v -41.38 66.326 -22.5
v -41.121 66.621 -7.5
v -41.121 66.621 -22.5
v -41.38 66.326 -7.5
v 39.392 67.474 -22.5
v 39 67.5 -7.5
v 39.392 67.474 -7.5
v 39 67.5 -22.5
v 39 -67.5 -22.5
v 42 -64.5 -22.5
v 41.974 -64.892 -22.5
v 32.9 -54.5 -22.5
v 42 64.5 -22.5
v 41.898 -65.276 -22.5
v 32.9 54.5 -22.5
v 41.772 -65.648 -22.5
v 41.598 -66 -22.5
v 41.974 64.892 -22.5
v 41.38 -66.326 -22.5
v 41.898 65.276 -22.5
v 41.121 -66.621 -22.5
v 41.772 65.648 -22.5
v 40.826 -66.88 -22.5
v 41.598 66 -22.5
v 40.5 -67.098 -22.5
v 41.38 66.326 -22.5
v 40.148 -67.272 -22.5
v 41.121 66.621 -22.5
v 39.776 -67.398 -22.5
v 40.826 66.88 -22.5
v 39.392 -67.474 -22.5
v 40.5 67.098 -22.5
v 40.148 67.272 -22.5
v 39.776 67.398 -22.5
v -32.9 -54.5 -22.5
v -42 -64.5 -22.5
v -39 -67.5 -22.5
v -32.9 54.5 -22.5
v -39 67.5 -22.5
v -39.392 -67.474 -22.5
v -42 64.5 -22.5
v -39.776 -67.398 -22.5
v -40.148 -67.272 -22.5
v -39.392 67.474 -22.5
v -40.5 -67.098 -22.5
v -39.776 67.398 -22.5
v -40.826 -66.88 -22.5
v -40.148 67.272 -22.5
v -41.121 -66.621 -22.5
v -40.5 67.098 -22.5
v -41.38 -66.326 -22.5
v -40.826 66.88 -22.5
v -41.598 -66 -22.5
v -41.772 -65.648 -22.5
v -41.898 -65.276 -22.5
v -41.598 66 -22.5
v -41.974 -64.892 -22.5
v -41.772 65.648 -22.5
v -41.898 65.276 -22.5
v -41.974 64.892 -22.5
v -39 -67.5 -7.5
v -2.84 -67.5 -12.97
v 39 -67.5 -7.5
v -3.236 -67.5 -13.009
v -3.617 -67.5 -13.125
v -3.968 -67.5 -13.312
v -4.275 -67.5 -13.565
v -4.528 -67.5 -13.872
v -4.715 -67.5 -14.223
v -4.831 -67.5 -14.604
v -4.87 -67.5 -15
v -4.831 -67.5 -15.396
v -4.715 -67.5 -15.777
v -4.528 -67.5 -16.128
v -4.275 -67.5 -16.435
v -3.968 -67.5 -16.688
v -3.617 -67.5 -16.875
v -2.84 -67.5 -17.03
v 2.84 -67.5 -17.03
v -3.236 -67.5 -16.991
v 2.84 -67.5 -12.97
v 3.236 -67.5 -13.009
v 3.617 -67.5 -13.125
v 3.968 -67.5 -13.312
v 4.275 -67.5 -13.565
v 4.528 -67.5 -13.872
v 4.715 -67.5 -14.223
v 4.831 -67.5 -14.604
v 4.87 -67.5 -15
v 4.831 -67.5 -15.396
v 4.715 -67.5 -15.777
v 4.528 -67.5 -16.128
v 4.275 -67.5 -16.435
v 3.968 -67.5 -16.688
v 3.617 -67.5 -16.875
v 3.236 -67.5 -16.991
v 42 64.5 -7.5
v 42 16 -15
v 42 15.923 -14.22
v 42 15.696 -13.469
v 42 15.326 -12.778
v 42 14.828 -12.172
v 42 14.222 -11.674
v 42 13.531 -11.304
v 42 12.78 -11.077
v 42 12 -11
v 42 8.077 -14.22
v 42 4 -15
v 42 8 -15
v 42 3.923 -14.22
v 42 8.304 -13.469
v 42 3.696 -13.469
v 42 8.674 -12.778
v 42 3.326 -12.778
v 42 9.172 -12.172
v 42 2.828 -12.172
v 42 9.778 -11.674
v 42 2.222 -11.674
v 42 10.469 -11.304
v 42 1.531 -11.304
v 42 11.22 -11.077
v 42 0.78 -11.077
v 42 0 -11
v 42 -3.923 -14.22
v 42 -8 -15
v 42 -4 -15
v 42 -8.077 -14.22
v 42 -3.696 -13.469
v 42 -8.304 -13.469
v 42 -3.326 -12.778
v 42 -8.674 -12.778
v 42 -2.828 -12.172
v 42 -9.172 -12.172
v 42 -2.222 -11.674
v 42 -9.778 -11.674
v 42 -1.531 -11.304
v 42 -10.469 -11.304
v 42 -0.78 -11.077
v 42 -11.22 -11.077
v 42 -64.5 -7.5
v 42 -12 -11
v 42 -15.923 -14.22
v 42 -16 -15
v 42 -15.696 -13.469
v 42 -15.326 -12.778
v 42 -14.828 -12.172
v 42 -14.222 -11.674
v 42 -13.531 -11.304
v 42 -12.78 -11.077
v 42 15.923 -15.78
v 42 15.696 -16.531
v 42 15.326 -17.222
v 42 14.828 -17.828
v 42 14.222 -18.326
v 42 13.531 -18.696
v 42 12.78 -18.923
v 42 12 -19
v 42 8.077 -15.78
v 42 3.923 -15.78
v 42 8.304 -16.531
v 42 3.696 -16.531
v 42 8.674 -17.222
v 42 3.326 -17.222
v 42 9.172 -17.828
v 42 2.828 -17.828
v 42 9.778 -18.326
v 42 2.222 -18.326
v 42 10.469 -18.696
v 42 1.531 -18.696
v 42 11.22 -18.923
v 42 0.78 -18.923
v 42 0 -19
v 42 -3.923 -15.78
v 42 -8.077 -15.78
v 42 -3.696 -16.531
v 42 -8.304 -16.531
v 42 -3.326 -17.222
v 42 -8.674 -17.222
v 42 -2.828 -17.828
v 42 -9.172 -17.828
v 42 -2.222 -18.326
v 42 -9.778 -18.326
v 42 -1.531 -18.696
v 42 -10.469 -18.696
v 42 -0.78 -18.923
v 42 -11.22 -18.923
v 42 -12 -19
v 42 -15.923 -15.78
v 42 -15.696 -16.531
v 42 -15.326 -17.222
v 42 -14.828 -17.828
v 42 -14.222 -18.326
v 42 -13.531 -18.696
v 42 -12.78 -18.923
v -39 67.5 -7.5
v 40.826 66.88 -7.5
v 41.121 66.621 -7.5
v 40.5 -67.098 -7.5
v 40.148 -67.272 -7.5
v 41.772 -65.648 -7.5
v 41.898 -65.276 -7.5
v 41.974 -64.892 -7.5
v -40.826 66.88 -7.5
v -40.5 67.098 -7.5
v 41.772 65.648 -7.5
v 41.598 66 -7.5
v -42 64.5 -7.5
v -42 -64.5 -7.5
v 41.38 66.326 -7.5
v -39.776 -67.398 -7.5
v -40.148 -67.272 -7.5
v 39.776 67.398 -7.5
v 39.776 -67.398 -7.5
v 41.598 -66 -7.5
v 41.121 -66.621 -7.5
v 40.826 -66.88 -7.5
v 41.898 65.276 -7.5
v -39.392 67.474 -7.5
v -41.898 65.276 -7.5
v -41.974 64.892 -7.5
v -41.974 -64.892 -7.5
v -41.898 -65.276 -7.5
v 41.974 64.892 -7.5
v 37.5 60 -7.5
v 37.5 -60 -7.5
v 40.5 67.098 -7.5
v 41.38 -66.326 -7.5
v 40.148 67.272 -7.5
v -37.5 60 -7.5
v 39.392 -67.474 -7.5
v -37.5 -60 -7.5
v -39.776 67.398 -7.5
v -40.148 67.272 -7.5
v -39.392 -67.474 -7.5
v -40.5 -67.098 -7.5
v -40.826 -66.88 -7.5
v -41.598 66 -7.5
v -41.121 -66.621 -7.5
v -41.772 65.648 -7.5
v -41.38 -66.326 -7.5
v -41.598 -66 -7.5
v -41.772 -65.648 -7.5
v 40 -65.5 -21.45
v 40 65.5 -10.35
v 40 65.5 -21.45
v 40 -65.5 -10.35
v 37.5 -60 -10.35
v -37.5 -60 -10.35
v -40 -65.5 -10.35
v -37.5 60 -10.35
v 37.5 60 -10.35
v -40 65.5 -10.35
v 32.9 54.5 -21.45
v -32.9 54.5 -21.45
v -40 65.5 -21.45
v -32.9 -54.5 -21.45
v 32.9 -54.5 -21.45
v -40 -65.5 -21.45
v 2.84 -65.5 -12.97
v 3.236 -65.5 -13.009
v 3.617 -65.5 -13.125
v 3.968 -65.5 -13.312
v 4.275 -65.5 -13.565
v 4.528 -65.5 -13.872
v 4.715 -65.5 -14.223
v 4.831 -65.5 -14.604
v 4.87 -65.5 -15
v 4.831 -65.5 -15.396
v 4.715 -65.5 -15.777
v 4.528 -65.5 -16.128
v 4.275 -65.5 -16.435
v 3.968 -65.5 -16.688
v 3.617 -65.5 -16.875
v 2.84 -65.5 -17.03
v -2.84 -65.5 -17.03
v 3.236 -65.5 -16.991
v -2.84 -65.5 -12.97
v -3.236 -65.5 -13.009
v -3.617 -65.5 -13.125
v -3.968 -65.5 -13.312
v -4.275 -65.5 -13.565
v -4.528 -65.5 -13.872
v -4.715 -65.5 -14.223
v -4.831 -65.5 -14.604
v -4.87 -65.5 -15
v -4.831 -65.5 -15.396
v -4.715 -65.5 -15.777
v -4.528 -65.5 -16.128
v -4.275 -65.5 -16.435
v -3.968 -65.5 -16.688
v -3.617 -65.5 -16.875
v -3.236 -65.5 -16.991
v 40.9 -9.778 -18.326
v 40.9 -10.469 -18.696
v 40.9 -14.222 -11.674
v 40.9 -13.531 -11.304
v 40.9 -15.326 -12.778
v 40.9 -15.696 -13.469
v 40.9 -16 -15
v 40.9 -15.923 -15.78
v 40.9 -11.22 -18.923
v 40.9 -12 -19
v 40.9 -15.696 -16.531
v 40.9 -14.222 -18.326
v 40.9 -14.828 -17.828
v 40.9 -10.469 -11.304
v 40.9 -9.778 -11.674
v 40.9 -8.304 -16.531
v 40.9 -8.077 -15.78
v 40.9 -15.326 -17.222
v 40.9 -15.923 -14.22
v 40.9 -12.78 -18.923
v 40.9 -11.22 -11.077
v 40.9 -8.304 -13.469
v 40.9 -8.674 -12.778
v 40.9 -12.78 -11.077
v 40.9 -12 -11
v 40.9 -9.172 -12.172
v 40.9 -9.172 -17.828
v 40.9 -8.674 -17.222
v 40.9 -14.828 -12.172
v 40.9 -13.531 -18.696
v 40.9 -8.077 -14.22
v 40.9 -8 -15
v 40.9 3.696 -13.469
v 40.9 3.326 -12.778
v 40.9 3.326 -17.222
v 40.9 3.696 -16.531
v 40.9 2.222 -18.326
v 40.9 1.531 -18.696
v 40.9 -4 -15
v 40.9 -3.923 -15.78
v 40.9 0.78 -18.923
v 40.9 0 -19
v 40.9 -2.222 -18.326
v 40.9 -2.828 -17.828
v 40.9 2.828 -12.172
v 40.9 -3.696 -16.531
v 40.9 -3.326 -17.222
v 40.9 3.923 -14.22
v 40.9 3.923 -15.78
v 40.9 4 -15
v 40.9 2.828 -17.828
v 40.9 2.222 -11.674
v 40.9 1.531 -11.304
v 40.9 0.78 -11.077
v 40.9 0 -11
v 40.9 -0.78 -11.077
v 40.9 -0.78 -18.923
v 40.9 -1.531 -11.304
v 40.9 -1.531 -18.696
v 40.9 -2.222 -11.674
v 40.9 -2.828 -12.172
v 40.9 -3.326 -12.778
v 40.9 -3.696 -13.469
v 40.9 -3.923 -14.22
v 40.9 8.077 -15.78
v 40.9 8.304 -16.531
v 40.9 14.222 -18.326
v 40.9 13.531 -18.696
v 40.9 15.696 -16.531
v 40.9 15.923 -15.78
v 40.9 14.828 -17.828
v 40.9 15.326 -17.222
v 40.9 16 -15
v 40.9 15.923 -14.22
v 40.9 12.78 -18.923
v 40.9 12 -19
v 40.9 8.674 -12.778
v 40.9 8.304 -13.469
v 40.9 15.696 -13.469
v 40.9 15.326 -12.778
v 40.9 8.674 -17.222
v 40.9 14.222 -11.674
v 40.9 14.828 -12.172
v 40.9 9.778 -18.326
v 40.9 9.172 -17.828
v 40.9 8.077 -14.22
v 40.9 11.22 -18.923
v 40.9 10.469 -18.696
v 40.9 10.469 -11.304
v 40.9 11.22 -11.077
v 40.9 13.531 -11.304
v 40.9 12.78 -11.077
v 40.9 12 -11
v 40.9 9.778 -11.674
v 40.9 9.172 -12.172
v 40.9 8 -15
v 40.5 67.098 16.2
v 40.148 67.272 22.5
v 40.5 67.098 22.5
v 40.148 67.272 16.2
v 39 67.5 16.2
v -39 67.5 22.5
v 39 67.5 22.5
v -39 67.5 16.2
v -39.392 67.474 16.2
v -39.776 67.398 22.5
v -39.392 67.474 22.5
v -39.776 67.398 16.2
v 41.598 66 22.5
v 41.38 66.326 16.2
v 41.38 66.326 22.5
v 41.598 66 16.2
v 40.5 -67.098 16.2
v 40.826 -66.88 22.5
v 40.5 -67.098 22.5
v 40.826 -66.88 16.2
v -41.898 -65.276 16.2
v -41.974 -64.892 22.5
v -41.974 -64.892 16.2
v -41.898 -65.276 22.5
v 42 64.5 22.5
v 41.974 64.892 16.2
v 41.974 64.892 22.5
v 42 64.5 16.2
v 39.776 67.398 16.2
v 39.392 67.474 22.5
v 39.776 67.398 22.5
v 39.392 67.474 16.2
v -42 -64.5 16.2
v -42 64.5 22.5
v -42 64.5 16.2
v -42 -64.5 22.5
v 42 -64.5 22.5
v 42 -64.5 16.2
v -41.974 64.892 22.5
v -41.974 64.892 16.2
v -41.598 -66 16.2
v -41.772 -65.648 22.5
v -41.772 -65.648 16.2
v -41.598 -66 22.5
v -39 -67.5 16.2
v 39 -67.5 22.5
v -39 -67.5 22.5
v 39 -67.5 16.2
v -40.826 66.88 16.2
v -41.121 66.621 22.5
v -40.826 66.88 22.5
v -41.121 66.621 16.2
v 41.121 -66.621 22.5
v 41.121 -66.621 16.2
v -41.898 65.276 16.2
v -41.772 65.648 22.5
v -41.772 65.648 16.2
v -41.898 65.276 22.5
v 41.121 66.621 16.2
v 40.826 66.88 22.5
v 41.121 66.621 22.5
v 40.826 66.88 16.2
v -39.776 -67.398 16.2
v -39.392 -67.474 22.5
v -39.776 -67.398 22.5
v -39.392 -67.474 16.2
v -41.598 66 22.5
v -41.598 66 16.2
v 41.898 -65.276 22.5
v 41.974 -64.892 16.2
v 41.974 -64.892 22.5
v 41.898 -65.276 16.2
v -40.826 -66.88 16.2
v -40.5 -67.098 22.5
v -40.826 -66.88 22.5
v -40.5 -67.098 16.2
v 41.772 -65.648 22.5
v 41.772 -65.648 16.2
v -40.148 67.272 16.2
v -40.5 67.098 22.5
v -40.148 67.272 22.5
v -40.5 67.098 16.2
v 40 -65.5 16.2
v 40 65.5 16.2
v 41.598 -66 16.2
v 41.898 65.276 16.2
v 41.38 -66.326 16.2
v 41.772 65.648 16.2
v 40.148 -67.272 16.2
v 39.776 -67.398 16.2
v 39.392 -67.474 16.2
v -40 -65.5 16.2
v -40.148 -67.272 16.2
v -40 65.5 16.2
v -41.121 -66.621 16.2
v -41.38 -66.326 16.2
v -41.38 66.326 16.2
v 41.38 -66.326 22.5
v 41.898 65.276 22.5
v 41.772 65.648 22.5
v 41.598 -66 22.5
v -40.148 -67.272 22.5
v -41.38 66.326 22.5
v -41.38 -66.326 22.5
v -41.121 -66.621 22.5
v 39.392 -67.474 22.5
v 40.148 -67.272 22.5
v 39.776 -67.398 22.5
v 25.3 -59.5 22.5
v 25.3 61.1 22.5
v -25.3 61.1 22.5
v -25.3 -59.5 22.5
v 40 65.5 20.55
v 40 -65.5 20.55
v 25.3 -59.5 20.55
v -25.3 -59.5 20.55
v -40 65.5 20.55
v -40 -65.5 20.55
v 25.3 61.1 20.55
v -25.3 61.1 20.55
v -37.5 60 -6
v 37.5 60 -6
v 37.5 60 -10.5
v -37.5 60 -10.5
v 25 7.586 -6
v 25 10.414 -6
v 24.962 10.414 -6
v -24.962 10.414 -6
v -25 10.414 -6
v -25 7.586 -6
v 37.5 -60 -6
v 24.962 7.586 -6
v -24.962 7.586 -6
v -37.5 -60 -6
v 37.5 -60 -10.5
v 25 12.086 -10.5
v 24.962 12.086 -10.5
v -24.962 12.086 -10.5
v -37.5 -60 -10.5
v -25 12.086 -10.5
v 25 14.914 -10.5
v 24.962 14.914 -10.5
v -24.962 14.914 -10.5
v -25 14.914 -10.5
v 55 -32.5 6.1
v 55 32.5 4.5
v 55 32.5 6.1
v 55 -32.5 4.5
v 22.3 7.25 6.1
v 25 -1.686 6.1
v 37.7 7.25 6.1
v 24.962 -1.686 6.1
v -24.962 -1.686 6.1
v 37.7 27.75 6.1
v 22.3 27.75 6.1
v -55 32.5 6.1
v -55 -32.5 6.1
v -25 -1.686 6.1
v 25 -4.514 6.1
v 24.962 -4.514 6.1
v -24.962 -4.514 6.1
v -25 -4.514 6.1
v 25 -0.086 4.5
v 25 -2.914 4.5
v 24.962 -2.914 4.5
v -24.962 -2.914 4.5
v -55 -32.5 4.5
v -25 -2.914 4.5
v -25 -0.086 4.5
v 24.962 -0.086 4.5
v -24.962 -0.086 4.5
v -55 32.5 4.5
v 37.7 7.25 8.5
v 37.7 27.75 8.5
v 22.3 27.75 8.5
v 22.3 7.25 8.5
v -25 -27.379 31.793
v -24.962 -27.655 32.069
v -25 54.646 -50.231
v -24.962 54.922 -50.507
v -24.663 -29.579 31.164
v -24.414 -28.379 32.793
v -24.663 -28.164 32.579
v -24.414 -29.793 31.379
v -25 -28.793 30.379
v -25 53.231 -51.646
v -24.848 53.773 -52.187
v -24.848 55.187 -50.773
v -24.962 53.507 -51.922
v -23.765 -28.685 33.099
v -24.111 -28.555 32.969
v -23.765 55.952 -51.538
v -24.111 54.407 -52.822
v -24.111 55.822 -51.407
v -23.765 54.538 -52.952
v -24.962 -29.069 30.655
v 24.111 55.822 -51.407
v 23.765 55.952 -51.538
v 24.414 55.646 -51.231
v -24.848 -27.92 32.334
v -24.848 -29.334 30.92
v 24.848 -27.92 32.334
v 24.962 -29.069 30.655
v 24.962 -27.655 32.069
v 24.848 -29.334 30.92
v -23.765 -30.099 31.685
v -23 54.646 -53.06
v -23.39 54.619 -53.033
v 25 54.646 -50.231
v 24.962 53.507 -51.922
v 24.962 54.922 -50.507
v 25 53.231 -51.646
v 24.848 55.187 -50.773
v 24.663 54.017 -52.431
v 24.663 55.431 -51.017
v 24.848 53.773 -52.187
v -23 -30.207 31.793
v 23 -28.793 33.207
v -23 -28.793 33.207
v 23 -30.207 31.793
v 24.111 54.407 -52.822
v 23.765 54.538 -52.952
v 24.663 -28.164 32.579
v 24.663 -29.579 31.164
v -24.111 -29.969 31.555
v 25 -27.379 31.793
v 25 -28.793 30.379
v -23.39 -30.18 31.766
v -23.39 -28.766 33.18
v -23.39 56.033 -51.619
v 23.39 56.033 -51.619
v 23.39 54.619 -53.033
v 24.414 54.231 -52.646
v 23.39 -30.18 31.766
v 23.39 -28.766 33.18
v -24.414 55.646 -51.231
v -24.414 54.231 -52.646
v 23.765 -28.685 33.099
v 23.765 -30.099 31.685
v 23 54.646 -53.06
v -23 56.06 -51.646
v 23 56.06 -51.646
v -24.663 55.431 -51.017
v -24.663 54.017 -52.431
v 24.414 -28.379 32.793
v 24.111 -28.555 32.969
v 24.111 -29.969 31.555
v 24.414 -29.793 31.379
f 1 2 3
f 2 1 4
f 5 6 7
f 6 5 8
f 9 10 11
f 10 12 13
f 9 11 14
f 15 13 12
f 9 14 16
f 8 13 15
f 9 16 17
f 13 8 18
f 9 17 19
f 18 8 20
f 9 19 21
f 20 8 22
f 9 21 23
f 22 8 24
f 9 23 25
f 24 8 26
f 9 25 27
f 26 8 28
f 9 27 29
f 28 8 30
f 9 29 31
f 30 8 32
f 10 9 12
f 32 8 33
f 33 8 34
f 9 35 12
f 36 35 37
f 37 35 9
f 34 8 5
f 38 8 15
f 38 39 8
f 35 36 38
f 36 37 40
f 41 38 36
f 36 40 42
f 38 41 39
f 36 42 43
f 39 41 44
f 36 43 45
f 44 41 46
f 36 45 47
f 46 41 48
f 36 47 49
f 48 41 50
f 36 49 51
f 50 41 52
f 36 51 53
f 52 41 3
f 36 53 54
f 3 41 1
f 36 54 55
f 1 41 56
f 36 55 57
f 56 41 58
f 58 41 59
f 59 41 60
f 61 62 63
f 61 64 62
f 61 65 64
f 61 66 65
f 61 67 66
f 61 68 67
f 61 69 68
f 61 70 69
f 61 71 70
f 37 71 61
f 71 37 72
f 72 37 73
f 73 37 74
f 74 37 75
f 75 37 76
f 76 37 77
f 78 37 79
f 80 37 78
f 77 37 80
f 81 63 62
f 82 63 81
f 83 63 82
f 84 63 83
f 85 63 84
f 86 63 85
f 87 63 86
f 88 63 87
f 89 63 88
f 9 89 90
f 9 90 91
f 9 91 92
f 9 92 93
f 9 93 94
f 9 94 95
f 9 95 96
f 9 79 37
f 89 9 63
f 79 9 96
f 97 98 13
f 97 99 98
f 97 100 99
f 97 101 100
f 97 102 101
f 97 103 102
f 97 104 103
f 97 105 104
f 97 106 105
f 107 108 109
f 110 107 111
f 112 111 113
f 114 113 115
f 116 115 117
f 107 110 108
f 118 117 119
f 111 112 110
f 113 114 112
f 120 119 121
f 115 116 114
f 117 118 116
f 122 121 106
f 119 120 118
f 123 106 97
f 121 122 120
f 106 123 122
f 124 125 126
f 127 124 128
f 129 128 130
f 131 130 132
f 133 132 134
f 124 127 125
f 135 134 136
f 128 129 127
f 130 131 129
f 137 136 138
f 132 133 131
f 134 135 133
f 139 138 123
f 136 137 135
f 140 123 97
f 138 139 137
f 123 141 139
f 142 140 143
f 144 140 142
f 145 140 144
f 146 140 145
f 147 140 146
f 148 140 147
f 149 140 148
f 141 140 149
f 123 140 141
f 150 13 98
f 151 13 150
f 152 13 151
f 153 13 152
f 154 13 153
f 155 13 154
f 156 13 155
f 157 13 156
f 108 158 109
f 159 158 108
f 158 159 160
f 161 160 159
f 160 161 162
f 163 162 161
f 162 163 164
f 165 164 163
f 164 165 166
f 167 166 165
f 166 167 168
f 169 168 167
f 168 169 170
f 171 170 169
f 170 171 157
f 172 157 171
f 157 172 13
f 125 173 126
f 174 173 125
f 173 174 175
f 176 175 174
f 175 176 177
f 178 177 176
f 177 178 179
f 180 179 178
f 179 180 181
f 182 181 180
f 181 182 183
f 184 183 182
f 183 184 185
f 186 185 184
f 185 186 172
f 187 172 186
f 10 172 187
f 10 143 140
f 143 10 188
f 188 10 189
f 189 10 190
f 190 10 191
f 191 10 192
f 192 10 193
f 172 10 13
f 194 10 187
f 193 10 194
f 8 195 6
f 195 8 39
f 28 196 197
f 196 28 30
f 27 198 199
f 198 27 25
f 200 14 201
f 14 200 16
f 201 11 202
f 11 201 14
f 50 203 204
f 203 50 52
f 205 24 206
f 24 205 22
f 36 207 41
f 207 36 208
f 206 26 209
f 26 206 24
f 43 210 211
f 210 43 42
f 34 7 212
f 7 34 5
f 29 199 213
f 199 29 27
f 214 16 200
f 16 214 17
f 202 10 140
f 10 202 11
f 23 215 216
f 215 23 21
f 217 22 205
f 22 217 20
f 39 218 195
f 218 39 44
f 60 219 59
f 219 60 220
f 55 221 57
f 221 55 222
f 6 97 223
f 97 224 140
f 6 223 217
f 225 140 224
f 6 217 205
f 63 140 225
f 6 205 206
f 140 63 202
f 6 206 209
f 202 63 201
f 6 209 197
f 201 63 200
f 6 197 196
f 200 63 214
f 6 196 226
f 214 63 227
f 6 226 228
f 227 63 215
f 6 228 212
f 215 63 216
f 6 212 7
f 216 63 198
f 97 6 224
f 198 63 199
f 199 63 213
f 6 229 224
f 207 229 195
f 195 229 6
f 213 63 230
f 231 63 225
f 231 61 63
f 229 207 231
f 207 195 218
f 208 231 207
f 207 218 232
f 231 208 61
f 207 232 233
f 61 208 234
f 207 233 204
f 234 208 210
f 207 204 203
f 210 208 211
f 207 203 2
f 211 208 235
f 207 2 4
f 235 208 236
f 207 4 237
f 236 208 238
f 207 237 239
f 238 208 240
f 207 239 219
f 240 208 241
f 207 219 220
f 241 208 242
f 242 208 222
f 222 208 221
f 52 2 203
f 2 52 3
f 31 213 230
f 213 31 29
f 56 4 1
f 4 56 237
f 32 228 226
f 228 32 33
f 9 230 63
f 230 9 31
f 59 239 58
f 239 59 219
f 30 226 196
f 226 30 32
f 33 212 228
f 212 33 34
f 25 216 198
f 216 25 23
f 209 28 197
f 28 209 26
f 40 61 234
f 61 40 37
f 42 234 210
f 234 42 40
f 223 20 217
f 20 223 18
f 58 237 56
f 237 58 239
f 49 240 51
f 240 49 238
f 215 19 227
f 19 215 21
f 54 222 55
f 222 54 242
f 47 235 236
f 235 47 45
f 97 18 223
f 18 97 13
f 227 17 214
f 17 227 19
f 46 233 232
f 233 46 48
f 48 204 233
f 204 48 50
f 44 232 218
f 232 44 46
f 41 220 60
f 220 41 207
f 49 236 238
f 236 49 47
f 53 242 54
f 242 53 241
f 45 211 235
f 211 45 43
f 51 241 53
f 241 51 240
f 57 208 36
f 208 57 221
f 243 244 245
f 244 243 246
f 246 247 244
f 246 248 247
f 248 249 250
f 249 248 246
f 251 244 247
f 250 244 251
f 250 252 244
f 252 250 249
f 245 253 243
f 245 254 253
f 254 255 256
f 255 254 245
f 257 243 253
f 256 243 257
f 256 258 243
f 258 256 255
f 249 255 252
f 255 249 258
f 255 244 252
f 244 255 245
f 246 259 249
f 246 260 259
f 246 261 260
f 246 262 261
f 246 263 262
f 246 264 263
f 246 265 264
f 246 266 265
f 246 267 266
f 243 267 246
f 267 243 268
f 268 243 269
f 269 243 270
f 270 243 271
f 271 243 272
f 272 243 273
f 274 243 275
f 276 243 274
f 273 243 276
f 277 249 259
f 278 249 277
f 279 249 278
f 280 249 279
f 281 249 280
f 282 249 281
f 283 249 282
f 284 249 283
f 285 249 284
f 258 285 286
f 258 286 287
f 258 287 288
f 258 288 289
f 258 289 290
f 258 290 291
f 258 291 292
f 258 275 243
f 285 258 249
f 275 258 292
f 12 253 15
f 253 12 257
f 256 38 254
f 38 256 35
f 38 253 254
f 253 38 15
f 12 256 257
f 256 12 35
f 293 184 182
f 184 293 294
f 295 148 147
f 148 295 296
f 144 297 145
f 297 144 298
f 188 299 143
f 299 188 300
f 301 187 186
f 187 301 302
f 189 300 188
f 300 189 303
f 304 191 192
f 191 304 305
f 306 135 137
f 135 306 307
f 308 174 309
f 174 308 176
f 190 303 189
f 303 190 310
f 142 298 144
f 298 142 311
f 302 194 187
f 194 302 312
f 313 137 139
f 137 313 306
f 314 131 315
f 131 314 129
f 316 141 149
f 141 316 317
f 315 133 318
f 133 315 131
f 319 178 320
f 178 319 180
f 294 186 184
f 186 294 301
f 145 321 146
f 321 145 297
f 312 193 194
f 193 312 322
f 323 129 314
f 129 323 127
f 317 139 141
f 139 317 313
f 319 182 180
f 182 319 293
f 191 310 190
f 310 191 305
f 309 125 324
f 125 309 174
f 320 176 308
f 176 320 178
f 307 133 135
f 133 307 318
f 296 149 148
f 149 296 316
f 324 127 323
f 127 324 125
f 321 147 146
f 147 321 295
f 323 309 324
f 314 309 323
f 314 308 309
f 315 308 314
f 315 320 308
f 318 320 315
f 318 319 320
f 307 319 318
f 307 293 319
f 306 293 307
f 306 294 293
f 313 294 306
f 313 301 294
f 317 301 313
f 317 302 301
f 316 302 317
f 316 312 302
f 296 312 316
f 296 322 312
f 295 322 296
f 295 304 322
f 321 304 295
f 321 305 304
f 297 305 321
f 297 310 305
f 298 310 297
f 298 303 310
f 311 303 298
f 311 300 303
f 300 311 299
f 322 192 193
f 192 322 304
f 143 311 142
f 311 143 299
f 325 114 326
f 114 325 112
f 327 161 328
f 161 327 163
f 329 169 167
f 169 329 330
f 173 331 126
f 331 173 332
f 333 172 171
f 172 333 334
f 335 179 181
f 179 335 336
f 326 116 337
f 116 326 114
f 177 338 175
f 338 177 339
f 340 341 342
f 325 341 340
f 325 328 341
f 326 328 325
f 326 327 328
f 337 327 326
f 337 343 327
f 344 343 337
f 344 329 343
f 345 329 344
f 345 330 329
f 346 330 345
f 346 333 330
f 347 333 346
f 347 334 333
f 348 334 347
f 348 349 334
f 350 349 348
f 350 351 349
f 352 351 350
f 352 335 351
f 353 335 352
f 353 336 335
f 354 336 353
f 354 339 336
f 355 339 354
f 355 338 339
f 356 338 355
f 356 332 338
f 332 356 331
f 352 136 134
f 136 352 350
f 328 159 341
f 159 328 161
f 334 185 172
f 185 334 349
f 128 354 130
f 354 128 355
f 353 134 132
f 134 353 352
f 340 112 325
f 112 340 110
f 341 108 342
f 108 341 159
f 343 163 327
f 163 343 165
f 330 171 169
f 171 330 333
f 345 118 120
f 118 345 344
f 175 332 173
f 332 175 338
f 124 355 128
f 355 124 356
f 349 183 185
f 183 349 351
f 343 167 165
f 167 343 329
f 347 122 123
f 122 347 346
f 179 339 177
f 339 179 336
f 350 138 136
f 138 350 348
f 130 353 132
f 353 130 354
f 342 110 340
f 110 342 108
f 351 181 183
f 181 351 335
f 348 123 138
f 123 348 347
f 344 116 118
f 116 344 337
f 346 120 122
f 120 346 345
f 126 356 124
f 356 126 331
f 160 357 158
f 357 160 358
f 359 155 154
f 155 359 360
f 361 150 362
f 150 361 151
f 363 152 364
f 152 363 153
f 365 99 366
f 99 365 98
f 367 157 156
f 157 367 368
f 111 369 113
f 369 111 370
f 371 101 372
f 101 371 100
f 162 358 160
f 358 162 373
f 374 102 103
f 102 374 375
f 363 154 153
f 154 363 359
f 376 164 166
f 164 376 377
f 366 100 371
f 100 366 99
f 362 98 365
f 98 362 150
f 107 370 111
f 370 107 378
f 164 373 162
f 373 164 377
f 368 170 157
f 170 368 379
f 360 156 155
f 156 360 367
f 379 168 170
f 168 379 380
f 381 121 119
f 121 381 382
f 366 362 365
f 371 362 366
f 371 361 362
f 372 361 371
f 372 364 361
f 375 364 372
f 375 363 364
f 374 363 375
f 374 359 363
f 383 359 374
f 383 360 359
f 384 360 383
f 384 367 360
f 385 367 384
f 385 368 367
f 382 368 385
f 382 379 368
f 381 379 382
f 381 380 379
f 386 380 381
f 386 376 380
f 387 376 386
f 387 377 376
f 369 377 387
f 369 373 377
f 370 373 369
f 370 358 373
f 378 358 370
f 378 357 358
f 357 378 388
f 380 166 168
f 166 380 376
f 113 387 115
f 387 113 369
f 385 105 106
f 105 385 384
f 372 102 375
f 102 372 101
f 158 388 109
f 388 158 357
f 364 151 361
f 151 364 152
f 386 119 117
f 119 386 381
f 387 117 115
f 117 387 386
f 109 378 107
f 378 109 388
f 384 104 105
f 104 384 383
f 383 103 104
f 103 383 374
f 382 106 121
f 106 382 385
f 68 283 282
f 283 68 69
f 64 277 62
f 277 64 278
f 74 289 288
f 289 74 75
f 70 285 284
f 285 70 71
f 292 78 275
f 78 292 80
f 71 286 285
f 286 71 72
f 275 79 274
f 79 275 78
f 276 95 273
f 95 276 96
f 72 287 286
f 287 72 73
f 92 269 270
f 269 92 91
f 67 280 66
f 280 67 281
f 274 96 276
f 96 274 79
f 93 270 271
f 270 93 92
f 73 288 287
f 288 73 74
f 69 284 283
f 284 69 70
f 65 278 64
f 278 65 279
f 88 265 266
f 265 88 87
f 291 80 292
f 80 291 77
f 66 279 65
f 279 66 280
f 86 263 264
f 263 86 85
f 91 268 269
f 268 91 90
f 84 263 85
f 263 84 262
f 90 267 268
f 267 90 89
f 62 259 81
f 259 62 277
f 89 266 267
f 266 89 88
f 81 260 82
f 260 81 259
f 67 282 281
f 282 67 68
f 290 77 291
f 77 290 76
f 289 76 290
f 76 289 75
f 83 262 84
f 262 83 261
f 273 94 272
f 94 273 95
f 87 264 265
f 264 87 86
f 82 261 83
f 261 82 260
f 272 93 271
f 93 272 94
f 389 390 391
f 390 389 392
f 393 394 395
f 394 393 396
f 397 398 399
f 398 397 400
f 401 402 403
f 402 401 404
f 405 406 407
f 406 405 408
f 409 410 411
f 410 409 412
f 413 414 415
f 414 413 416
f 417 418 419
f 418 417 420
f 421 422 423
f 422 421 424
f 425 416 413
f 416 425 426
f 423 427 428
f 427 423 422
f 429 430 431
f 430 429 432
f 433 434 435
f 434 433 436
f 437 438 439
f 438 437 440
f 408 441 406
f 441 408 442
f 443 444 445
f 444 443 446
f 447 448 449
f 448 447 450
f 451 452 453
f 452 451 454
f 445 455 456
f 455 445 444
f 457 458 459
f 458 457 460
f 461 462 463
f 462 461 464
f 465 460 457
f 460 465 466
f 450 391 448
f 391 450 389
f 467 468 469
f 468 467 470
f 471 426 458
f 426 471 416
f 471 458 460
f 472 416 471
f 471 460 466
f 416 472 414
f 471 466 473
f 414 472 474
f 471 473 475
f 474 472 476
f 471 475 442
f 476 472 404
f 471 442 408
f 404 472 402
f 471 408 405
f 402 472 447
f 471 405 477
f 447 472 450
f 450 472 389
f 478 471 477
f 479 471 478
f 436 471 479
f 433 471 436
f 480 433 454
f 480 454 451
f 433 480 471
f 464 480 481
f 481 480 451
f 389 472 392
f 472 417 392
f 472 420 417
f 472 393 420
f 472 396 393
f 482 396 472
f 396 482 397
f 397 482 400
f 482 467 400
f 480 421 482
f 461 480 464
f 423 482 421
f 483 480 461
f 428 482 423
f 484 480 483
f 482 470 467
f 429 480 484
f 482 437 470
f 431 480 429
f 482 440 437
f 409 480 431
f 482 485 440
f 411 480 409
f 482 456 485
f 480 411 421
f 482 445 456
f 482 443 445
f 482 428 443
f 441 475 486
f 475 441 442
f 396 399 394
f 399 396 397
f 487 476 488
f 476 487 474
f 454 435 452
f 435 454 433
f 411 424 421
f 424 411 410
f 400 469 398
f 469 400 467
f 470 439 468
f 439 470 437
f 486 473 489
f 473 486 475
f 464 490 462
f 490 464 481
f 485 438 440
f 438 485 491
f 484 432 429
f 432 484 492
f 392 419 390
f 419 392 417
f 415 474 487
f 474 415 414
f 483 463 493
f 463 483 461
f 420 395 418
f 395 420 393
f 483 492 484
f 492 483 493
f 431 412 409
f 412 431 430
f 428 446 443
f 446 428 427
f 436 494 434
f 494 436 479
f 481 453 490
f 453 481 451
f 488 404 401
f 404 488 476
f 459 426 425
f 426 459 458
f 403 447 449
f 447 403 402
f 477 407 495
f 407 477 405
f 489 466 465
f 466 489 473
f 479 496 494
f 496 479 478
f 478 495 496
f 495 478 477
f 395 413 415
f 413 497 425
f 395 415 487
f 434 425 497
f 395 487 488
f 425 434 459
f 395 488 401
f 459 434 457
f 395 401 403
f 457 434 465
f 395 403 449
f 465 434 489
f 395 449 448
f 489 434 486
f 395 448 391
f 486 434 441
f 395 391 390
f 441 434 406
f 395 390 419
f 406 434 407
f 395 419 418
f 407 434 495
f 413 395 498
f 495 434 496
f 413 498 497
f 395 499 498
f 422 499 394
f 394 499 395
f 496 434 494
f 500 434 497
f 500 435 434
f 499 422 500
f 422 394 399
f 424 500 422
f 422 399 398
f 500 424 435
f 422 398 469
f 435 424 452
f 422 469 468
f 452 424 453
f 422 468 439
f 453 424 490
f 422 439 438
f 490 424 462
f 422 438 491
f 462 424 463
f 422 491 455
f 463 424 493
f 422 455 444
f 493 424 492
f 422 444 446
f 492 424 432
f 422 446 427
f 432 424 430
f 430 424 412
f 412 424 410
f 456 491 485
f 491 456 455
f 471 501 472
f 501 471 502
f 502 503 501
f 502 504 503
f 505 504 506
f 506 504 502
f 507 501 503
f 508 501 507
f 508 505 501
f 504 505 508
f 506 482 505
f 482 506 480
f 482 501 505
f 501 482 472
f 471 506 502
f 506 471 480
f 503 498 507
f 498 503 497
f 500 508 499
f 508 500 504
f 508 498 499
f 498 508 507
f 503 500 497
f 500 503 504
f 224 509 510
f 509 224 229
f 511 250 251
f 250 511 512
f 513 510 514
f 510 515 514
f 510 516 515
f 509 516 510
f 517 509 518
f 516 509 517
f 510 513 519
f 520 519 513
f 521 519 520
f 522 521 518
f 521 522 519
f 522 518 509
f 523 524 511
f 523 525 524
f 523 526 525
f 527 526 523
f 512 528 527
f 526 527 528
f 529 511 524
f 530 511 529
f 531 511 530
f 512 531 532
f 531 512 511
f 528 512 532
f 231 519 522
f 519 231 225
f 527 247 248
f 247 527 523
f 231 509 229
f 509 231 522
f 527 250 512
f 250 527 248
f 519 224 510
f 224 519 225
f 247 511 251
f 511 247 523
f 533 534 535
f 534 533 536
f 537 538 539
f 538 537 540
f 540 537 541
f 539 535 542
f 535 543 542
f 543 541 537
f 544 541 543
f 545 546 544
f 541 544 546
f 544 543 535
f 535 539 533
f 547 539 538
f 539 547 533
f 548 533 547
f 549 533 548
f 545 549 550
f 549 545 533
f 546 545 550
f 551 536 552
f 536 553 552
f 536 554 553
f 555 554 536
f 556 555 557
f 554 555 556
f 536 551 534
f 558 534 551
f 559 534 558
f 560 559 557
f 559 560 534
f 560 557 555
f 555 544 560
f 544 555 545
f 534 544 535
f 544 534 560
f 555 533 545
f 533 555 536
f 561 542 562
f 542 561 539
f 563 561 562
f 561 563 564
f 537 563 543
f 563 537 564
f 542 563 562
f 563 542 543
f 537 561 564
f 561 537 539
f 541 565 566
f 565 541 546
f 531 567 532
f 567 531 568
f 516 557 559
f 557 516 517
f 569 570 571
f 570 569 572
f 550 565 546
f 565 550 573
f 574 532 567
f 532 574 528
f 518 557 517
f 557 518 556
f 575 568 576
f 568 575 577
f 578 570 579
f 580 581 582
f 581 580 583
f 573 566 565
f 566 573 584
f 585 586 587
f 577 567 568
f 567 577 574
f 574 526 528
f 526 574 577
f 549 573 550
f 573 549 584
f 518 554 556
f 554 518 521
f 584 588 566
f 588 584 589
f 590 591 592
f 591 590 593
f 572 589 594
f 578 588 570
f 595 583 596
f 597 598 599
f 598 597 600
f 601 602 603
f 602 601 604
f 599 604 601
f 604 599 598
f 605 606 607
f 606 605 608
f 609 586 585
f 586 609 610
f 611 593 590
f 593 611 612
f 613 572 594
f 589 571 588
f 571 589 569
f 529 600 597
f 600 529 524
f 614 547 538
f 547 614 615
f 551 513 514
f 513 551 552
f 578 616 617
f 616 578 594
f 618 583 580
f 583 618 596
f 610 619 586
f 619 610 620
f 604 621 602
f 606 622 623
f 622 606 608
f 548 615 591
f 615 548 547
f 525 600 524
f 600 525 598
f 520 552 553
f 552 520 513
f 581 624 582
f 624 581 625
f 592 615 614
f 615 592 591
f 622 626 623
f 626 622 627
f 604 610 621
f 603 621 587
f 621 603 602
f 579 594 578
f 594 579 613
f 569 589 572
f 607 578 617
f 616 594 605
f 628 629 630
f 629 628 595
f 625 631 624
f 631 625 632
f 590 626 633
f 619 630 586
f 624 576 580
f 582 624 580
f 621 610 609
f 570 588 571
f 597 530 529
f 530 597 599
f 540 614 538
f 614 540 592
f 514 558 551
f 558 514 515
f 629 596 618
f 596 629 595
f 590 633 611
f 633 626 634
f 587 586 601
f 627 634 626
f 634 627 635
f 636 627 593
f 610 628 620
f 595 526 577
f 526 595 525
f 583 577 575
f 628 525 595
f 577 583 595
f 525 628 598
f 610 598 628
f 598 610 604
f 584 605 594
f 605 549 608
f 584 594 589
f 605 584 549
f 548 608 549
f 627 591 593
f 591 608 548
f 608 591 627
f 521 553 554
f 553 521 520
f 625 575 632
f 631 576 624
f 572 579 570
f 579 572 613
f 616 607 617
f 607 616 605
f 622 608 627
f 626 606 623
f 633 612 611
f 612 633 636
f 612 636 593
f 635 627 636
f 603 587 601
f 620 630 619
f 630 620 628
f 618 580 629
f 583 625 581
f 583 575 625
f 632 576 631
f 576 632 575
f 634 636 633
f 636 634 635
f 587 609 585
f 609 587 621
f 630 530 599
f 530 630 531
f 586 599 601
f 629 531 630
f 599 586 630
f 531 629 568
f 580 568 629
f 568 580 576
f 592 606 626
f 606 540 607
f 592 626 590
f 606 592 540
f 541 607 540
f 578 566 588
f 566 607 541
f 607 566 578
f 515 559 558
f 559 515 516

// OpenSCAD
union() {
	translate(v = [0, 0, -15]) {
		color(alpha = 0.9, c = "LightGray") {
			difference() {
				difference() {
					difference() {
						difference() {
							difference() {
								hull() {
									translate(v = [-39.0, -64.5, 0]) {
										cylinder($fn = 48, center = true, h = 15.0, r = 3.0);
									}
									translate(v = [-39.0, 64.5, 0]) {
										cylinder($fn = 48, center = true, h = 15.0, r = 3.0);
									}
									translate(v = [39.0, -64.5, 0]) {
										cylinder($fn = 48, center = true, h = 15.0, r = 3.0);
									}
									translate(v = [39.0, 64.5, 0]) {
										cylinder($fn = 48, center = true, h = 15.0, r = 3.0);
									}
								}
								translate(v = [0, 0, -0.9]) {
									cube(center = true, size = [80.0, 131.0, 11.1]);
								}
							}
							translate(v = [0, 0, -3.0]) {
								cube(center = true, size = [75.4, 120.4, 5.1]);
							}
						}
						translate(v = [0, 0, -6.5]) {
							cube(center = true, size = [65.8, 109.0, 2.2]);
						}
					}
					union() {
						translate(v = [42.0, -12.0, 0]) {
							rotate(a = [0, 90, 0]) {
								cylinder($fn = 32, center = true, d = 8.0, h = 2.2);
							}
						}
						translate(v = [42.0, 0.0, 0]) {
							rotate(a = [0, 90, 0]) {
								cylinder($fn = 32, center = true, d = 8.0, h = 2.2);
							}
						}
						translate(v = [42.0, 12.0, 0]) {
							rotate(a = [0, 90, 0]) {
								cylinder($fn = 32, center = true, d = 8.0, h = 2.2);
							}
						}
					}
				}
				translate(v = [0, -67.5, 0]) {
					rotate(a = [90, 0, 0]) {
						linear_extrude(center = true, height = 15.2) {
							hull() {
								translate(v = [-2.84, 0]) {
									circle($fn = 32, r = 2.0300000000000002);
								}
								translate(v = [2.84, 0]) {
									circle($fn = 32, r = 2.0300000000000002);
								}
							}
						}
					}
				}
			}
		}
	}
	translate(v = [0, 0, 15]) {
		color(alpha = 0.85, c = "DarkGray") {
			difference() {
				difference() {
					translate(v = [0, 0, 4.35]) {
						hull() {
							translate(v = [-39.0, -64.5, 0]) {
								cylinder($fn = 48, center = true, h = 6.3, r = 3.0);
							}
							translate(v = [-39.0, 64.5, 0]) {
								cylinder($fn = 48, center = true, h = 6.3, r = 3.0);
							}
							translate(v = [39.0, -64.5, 0]) {
								cylinder($fn = 48, center = true, h = 6.3, r = 3.0);
							}
							translate(v = [39.0, 64.5, 0]) {
								cylinder($fn = 48, center = true, h = 6.3, r = 3.0);
							}
						}
					}
					translate(v = [0, 0, 3.3500000000000005]) {
						cube(center = true, size = [80.0, 131.0, 4.3999999999999995]);
					}
				}
				translate(v = [0, 0.7999999999999972, 6.35]) {
					cube(center = true, size = [50.6, 120.6, 2.4]);
				}
			}
		}
	}
	translate(v = [0, 30, 25]) {
		color(alpha = 0.75, c = "Gray") {
			translate(v = [0, -59.5, 7.5]) {
				rotate(a = [-45, 0, 0]) {
					translate(v = [0, 60.0, 0]) {
						hull() {
							translate(v = [-23.0, -58.0, 0]) {
								cylinder($fn = 32, center = true, h = 2.0, r = 2.0);
							}
							translate(v = [-23.0, 58.0, 0]) {
								cylinder($fn = 32, center = true, h = 2.0, r = 2.0);
							}
							translate(v = [23.0, -58.0, 0]) {
								cylinder($fn = 32, center = true, h = 2.0, r = 2.0);
							}
							translate(v = [23.0, 58.0, 0]) {
								cylinder($fn = 32, center = true, h = 2.0, r = 2.0);
							}
						}
					}
				}
			}
		}
	}
	translate(v = [0, 0, -5]) {
		translate(v = [0, 0, -3.25]) {
			rotate(a = [0, 0, 90]) {
				union() {
					color(alpha = 0.5, c = "DodgerBlue") {
						cube(center = true, size = [120.0, 75.0, 4.5]);
					}
					color(alpha = 0.7, c = "LightBlue") {
						translate(v = [0, 0, 1.75]) {
							cube(center = true, size = [108.0, 64.8, 1.0]);
						}
					}
				}
			}
		}
	}
	translate(v = [0, 0, 5]) {
		translate(v = [0, 0, 0.30000000000000004]) {
			union() {
				color(alpha = 0.5, c = "ForestGreen") {
					cube(center = true, size = [110.0, 65.0, 1.6]);
				}
				color(alpha = 0.6, c = "DarkGreen") {
					translate(v = [30.0, 17.5, 2.0]) {
						cube(center = true, size = [15.4, 20.5, 2.4]);
					}
				}
			}
		}
	}
}
